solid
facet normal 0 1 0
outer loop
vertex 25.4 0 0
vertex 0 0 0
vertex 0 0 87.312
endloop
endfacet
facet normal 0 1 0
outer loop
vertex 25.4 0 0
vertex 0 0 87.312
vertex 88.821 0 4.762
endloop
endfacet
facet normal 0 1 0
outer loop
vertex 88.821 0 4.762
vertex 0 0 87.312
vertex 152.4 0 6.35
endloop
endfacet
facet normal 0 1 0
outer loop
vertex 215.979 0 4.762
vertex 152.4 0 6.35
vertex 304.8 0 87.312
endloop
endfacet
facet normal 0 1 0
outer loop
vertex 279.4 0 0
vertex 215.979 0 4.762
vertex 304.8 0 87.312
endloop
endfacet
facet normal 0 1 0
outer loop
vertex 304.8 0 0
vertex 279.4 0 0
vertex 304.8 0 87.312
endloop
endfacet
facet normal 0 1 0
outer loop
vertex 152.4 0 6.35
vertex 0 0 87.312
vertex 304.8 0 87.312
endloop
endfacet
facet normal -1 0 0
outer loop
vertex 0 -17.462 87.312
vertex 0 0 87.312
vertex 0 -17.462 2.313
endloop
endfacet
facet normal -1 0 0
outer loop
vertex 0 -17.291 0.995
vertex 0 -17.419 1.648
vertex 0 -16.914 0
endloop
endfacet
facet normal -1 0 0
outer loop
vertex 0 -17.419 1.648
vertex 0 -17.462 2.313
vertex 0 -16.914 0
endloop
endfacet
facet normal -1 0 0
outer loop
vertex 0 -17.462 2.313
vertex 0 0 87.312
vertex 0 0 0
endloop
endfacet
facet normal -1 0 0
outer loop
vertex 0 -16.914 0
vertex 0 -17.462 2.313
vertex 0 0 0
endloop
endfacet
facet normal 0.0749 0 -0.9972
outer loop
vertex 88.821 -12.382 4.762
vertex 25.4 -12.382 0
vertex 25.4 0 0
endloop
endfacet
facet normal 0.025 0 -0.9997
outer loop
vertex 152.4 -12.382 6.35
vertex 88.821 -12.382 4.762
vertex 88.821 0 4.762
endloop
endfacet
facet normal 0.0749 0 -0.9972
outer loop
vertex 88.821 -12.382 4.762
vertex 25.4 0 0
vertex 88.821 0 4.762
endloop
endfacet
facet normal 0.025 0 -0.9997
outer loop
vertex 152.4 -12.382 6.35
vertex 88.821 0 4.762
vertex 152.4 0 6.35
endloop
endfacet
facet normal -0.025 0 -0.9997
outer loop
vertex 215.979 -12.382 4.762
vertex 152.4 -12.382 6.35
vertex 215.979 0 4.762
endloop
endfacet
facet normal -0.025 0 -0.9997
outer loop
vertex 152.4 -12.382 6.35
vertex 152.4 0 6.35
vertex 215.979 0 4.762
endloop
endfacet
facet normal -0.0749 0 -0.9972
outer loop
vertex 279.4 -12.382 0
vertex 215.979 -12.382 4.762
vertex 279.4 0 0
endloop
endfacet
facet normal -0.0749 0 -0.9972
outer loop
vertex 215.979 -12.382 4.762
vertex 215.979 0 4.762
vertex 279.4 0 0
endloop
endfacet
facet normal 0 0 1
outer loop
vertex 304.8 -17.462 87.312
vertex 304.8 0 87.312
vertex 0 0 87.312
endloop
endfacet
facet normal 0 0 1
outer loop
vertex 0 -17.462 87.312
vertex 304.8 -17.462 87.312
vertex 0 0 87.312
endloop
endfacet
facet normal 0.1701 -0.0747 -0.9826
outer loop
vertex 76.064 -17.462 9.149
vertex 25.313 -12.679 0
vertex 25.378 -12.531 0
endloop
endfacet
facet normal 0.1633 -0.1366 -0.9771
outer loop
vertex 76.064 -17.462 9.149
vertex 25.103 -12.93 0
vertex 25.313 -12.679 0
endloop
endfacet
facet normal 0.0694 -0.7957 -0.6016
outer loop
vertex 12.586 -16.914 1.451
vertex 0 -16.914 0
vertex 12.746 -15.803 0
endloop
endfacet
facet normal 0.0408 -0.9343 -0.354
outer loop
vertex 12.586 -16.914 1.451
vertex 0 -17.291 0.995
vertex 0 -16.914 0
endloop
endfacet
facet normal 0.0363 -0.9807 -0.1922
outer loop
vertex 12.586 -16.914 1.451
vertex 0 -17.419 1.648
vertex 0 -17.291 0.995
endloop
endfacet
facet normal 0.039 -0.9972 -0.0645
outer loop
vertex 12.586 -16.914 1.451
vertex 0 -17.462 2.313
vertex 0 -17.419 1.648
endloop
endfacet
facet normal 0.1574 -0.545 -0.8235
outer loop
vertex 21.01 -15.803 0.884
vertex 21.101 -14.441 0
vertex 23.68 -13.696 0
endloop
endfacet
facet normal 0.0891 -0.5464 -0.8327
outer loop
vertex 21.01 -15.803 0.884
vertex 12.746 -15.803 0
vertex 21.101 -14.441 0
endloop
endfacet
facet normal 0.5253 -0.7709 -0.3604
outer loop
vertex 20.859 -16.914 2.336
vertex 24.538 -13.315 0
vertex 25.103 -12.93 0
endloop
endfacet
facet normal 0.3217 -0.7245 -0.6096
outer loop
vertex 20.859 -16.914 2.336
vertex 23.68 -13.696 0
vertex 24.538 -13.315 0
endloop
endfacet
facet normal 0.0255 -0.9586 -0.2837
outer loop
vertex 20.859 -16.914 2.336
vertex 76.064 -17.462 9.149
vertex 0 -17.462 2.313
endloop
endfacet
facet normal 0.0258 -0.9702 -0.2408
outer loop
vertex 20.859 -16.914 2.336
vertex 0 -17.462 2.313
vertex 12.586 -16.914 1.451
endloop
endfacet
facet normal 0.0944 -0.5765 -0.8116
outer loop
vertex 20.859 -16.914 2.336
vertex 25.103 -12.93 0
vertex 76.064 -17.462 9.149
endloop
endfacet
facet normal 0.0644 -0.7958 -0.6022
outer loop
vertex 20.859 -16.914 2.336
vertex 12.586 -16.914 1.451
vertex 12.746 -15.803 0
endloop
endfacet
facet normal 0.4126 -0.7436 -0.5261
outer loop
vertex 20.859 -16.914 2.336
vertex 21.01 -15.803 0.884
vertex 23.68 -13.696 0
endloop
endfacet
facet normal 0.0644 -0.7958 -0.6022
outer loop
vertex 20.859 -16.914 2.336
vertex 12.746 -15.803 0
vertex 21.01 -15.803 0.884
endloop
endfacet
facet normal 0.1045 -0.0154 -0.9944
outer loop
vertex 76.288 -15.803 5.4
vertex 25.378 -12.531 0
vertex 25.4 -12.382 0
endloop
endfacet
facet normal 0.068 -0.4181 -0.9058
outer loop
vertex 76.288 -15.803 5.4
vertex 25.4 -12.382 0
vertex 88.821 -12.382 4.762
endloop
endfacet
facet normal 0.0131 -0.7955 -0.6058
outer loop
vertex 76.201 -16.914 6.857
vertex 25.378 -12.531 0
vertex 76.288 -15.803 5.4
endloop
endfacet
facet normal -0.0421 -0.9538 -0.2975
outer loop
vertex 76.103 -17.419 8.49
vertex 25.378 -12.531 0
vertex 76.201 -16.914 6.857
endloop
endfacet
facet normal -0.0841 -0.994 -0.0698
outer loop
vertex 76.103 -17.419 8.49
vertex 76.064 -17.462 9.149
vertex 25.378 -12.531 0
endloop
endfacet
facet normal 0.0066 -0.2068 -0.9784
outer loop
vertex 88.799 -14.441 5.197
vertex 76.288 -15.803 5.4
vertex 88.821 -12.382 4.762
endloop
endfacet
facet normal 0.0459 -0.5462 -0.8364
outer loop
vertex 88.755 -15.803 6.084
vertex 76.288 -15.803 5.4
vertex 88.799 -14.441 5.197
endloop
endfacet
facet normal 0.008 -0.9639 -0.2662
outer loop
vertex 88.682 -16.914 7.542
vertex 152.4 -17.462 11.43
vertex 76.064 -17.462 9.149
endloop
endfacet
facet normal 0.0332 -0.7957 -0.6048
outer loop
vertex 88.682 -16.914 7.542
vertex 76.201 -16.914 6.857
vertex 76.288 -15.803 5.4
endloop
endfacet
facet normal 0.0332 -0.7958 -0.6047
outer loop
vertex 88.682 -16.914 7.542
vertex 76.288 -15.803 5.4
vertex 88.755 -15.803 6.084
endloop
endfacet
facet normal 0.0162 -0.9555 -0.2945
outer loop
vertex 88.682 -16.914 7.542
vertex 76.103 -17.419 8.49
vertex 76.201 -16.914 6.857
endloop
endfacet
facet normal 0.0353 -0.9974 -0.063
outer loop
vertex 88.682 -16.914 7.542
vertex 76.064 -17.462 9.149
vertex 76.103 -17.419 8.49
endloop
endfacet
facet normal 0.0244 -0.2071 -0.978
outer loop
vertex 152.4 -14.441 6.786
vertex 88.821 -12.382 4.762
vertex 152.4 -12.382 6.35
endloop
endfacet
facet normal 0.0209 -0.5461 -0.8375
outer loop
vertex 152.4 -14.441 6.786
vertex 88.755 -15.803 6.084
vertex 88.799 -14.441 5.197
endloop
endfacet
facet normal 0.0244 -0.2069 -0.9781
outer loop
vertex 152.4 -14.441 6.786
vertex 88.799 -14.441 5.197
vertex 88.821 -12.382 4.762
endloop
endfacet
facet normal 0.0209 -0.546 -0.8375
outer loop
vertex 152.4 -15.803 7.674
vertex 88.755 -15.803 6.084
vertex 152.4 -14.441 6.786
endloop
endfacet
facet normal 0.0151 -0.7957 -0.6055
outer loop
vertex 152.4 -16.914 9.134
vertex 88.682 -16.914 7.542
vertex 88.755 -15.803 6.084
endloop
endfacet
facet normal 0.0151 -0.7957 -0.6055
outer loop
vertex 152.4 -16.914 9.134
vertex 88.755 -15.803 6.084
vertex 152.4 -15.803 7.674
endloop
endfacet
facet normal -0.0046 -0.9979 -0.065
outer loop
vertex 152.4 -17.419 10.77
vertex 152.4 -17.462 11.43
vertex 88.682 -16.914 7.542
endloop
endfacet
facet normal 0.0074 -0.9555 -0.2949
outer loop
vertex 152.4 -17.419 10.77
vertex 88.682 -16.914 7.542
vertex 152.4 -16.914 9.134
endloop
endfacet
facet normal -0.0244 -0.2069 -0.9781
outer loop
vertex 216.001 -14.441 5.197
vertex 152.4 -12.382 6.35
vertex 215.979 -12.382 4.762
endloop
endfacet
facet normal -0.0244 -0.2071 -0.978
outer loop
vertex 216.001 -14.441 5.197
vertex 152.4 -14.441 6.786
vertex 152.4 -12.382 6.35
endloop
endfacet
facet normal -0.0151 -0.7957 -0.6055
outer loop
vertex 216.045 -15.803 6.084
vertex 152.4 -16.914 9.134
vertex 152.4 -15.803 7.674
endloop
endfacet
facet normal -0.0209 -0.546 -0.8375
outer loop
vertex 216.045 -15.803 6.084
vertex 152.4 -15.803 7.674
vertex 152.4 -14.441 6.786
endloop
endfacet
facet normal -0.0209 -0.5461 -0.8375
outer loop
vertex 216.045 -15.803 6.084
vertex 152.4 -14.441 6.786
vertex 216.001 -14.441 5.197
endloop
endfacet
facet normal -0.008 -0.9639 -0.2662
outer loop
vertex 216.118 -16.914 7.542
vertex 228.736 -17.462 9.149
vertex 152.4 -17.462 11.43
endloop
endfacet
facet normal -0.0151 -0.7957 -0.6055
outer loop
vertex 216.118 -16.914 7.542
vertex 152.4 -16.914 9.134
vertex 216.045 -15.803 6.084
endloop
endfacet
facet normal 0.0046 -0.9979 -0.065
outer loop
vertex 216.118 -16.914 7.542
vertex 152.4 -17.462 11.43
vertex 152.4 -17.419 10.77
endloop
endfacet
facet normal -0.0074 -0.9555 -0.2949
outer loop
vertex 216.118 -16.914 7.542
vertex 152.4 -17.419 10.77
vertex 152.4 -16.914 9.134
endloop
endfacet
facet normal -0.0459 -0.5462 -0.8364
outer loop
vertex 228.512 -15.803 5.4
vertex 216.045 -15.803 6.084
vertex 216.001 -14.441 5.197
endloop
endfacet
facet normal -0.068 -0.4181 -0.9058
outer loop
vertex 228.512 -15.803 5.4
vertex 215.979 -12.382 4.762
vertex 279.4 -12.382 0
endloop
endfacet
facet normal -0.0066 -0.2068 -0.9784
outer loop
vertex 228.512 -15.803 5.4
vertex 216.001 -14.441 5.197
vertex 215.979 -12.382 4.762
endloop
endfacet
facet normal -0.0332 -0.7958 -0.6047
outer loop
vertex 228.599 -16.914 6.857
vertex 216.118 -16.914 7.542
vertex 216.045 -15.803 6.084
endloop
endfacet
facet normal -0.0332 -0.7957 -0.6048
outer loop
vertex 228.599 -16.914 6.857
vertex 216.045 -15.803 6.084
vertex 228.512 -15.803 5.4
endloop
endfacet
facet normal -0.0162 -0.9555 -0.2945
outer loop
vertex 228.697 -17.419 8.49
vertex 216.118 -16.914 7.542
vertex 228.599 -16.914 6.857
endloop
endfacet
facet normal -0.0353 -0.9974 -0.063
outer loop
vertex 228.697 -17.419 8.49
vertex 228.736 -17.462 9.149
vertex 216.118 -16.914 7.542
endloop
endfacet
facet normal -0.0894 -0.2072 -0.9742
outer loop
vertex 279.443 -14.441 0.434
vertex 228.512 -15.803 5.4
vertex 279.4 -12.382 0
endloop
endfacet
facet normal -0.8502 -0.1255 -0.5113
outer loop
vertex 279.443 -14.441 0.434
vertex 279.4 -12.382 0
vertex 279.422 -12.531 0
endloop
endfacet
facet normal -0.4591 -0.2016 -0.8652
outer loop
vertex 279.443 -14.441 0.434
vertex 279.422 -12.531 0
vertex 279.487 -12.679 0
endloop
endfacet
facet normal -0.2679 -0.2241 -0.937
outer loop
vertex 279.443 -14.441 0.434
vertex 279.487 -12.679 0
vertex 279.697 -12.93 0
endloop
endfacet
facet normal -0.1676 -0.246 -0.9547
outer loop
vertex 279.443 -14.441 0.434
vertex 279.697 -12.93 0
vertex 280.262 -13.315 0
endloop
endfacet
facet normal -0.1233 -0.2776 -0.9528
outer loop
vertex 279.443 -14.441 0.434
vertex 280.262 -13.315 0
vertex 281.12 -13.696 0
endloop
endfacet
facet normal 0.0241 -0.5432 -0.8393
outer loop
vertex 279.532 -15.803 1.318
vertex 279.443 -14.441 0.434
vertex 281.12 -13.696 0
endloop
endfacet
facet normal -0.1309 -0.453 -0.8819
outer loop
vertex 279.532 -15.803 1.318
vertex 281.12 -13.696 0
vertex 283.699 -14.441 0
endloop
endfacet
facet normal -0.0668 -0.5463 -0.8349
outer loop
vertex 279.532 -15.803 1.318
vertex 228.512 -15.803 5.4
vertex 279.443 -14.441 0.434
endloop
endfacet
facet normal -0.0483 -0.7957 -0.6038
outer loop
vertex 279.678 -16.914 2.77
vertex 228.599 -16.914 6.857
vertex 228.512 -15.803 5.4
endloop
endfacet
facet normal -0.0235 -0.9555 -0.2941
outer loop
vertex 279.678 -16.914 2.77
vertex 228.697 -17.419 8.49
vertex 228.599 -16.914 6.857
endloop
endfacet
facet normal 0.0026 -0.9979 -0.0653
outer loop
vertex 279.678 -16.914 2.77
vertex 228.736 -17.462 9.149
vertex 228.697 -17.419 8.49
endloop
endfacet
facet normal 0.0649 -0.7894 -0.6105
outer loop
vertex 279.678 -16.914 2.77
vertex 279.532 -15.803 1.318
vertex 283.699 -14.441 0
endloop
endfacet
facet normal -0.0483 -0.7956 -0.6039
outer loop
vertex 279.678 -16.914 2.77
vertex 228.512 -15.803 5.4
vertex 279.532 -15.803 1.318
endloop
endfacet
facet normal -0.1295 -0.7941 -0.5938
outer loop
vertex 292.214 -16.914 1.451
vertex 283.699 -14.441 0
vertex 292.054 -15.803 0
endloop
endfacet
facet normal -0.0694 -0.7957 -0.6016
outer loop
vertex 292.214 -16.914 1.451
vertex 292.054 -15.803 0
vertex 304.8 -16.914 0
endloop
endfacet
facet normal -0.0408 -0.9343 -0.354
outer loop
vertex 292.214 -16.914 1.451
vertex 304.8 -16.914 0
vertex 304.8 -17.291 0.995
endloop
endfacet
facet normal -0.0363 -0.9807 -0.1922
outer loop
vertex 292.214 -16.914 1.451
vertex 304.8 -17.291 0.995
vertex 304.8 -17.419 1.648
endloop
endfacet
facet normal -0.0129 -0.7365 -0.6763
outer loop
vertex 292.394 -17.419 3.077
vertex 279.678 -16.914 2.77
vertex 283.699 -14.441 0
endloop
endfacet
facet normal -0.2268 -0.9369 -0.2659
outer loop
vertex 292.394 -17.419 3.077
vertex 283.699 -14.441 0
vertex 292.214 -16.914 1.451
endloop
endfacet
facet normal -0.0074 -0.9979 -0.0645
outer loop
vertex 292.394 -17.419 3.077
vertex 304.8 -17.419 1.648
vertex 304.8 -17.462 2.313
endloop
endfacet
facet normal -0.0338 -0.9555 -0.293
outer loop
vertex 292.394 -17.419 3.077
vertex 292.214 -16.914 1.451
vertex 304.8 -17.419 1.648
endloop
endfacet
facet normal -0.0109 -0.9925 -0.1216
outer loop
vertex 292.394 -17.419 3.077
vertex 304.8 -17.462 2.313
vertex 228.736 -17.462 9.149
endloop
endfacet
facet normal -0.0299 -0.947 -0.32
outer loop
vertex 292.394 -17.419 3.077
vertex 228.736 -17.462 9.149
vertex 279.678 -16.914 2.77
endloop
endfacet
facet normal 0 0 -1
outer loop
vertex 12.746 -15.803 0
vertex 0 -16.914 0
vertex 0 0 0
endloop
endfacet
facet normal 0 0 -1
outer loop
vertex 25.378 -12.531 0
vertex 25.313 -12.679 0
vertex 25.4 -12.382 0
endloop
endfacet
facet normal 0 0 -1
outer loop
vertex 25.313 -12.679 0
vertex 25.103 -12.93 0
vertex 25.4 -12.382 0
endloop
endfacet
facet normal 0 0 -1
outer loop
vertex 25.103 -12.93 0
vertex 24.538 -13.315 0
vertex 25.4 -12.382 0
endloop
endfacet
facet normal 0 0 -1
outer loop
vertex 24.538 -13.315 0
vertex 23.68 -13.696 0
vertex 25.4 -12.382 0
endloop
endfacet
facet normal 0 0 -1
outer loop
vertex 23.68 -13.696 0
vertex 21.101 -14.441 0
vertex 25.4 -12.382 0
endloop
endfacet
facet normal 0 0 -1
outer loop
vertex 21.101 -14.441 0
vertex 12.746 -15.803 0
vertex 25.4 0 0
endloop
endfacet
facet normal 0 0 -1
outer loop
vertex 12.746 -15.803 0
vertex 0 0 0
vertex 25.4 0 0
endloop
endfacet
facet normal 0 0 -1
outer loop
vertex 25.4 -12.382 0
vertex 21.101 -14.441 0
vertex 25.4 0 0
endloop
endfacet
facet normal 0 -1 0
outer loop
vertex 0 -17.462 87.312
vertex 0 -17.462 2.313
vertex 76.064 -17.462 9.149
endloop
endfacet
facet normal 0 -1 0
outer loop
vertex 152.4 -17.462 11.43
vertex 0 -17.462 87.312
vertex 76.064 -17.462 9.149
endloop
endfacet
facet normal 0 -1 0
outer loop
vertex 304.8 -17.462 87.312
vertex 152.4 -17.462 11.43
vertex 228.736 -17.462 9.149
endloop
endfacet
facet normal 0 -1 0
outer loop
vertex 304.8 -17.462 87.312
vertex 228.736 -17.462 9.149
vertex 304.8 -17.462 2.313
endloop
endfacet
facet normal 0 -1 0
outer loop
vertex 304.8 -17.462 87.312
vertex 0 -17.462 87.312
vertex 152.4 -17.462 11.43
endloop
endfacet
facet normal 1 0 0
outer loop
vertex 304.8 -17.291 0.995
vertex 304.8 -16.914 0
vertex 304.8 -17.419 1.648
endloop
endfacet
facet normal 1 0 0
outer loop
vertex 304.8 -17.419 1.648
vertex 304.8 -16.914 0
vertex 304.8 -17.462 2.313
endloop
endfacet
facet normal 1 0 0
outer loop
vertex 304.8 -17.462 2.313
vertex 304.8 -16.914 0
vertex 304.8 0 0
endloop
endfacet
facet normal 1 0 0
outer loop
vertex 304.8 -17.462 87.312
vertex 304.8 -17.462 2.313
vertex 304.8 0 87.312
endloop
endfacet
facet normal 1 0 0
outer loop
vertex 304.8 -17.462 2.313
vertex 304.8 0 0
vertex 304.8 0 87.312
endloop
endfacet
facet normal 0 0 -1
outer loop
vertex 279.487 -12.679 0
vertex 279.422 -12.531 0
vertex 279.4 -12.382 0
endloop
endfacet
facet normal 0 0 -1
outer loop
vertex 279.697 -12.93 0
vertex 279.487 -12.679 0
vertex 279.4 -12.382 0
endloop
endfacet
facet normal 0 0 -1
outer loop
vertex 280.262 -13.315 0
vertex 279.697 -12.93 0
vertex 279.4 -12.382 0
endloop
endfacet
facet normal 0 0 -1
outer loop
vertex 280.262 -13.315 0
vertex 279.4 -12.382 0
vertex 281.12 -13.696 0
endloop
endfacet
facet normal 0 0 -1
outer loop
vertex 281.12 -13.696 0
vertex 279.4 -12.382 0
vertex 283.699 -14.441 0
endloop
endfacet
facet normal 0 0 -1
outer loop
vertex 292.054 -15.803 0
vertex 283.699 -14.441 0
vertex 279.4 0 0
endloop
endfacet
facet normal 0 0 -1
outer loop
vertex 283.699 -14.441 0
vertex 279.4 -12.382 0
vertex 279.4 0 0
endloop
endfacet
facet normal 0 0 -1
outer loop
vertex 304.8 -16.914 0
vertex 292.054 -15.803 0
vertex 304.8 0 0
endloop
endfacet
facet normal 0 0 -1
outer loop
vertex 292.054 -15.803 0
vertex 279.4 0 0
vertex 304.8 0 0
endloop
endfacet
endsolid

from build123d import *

# Parameters (mm, degrees)
F1_DEPTH    = 17.4625
F2_T2_ANGLE = 17.1649477786


# Not quite as in the source:
# - a fillet or chamfer that OpenCascade refuses, or shapes differently, is made with other operations: its cross-section is extruded or revolved along the edge and cut away or added


with BuildPart() as f1:
    # F0 (on Front) → F1 (new body)
    with BuildSketch(Plane.XZ):
        with BuildLine():
            Line((0, 87.3125), (0, 0))
            Line((0, 0), (25.4, 0))
            ThreePointArc((25.4, 0), (152.4, 6.35), (279.4, 0))
            Line((279.4, 0), (304.8, 0))
            Line((304.8, 0), (304.8, 87.3125))
            Line((304.8, 87.3125), (0, 87.3125))
        make_face()
    extrude(amount=F1_DEPTH)

    # F2: fillet of radius 5.08 on 1 edges, made by hand

    # F2_s1 → F2_t2 (revolve, cut)
    with BuildSketch(Plane(origin=(-37.9289804695, 0, -5.7243521326), x_dir=(0, 1, 0), z_dir=(-0.9888020759, 0, -0.1492328874))):
        with BuildLine():
            ThreePointArc((-12.3825, 2.2072818505), (-15.9746024484, 0.7193842989), (-17.4625, -2.8727181495))
            Line((-17.4625, -2.8727181495), (-17.4625, 2.2072818505))
            Line((-17.4625, 2.2072818505), (-12.3825, 2.2072818505))
        make_face()
    revolve(axis=Axis((152.4, -17.4625, -1266.8250000001), (0, 1, 0)), revolution_arc=F2_T2_ANGLE, mode=Mode.SUBTRACT)


solid = f1.part
